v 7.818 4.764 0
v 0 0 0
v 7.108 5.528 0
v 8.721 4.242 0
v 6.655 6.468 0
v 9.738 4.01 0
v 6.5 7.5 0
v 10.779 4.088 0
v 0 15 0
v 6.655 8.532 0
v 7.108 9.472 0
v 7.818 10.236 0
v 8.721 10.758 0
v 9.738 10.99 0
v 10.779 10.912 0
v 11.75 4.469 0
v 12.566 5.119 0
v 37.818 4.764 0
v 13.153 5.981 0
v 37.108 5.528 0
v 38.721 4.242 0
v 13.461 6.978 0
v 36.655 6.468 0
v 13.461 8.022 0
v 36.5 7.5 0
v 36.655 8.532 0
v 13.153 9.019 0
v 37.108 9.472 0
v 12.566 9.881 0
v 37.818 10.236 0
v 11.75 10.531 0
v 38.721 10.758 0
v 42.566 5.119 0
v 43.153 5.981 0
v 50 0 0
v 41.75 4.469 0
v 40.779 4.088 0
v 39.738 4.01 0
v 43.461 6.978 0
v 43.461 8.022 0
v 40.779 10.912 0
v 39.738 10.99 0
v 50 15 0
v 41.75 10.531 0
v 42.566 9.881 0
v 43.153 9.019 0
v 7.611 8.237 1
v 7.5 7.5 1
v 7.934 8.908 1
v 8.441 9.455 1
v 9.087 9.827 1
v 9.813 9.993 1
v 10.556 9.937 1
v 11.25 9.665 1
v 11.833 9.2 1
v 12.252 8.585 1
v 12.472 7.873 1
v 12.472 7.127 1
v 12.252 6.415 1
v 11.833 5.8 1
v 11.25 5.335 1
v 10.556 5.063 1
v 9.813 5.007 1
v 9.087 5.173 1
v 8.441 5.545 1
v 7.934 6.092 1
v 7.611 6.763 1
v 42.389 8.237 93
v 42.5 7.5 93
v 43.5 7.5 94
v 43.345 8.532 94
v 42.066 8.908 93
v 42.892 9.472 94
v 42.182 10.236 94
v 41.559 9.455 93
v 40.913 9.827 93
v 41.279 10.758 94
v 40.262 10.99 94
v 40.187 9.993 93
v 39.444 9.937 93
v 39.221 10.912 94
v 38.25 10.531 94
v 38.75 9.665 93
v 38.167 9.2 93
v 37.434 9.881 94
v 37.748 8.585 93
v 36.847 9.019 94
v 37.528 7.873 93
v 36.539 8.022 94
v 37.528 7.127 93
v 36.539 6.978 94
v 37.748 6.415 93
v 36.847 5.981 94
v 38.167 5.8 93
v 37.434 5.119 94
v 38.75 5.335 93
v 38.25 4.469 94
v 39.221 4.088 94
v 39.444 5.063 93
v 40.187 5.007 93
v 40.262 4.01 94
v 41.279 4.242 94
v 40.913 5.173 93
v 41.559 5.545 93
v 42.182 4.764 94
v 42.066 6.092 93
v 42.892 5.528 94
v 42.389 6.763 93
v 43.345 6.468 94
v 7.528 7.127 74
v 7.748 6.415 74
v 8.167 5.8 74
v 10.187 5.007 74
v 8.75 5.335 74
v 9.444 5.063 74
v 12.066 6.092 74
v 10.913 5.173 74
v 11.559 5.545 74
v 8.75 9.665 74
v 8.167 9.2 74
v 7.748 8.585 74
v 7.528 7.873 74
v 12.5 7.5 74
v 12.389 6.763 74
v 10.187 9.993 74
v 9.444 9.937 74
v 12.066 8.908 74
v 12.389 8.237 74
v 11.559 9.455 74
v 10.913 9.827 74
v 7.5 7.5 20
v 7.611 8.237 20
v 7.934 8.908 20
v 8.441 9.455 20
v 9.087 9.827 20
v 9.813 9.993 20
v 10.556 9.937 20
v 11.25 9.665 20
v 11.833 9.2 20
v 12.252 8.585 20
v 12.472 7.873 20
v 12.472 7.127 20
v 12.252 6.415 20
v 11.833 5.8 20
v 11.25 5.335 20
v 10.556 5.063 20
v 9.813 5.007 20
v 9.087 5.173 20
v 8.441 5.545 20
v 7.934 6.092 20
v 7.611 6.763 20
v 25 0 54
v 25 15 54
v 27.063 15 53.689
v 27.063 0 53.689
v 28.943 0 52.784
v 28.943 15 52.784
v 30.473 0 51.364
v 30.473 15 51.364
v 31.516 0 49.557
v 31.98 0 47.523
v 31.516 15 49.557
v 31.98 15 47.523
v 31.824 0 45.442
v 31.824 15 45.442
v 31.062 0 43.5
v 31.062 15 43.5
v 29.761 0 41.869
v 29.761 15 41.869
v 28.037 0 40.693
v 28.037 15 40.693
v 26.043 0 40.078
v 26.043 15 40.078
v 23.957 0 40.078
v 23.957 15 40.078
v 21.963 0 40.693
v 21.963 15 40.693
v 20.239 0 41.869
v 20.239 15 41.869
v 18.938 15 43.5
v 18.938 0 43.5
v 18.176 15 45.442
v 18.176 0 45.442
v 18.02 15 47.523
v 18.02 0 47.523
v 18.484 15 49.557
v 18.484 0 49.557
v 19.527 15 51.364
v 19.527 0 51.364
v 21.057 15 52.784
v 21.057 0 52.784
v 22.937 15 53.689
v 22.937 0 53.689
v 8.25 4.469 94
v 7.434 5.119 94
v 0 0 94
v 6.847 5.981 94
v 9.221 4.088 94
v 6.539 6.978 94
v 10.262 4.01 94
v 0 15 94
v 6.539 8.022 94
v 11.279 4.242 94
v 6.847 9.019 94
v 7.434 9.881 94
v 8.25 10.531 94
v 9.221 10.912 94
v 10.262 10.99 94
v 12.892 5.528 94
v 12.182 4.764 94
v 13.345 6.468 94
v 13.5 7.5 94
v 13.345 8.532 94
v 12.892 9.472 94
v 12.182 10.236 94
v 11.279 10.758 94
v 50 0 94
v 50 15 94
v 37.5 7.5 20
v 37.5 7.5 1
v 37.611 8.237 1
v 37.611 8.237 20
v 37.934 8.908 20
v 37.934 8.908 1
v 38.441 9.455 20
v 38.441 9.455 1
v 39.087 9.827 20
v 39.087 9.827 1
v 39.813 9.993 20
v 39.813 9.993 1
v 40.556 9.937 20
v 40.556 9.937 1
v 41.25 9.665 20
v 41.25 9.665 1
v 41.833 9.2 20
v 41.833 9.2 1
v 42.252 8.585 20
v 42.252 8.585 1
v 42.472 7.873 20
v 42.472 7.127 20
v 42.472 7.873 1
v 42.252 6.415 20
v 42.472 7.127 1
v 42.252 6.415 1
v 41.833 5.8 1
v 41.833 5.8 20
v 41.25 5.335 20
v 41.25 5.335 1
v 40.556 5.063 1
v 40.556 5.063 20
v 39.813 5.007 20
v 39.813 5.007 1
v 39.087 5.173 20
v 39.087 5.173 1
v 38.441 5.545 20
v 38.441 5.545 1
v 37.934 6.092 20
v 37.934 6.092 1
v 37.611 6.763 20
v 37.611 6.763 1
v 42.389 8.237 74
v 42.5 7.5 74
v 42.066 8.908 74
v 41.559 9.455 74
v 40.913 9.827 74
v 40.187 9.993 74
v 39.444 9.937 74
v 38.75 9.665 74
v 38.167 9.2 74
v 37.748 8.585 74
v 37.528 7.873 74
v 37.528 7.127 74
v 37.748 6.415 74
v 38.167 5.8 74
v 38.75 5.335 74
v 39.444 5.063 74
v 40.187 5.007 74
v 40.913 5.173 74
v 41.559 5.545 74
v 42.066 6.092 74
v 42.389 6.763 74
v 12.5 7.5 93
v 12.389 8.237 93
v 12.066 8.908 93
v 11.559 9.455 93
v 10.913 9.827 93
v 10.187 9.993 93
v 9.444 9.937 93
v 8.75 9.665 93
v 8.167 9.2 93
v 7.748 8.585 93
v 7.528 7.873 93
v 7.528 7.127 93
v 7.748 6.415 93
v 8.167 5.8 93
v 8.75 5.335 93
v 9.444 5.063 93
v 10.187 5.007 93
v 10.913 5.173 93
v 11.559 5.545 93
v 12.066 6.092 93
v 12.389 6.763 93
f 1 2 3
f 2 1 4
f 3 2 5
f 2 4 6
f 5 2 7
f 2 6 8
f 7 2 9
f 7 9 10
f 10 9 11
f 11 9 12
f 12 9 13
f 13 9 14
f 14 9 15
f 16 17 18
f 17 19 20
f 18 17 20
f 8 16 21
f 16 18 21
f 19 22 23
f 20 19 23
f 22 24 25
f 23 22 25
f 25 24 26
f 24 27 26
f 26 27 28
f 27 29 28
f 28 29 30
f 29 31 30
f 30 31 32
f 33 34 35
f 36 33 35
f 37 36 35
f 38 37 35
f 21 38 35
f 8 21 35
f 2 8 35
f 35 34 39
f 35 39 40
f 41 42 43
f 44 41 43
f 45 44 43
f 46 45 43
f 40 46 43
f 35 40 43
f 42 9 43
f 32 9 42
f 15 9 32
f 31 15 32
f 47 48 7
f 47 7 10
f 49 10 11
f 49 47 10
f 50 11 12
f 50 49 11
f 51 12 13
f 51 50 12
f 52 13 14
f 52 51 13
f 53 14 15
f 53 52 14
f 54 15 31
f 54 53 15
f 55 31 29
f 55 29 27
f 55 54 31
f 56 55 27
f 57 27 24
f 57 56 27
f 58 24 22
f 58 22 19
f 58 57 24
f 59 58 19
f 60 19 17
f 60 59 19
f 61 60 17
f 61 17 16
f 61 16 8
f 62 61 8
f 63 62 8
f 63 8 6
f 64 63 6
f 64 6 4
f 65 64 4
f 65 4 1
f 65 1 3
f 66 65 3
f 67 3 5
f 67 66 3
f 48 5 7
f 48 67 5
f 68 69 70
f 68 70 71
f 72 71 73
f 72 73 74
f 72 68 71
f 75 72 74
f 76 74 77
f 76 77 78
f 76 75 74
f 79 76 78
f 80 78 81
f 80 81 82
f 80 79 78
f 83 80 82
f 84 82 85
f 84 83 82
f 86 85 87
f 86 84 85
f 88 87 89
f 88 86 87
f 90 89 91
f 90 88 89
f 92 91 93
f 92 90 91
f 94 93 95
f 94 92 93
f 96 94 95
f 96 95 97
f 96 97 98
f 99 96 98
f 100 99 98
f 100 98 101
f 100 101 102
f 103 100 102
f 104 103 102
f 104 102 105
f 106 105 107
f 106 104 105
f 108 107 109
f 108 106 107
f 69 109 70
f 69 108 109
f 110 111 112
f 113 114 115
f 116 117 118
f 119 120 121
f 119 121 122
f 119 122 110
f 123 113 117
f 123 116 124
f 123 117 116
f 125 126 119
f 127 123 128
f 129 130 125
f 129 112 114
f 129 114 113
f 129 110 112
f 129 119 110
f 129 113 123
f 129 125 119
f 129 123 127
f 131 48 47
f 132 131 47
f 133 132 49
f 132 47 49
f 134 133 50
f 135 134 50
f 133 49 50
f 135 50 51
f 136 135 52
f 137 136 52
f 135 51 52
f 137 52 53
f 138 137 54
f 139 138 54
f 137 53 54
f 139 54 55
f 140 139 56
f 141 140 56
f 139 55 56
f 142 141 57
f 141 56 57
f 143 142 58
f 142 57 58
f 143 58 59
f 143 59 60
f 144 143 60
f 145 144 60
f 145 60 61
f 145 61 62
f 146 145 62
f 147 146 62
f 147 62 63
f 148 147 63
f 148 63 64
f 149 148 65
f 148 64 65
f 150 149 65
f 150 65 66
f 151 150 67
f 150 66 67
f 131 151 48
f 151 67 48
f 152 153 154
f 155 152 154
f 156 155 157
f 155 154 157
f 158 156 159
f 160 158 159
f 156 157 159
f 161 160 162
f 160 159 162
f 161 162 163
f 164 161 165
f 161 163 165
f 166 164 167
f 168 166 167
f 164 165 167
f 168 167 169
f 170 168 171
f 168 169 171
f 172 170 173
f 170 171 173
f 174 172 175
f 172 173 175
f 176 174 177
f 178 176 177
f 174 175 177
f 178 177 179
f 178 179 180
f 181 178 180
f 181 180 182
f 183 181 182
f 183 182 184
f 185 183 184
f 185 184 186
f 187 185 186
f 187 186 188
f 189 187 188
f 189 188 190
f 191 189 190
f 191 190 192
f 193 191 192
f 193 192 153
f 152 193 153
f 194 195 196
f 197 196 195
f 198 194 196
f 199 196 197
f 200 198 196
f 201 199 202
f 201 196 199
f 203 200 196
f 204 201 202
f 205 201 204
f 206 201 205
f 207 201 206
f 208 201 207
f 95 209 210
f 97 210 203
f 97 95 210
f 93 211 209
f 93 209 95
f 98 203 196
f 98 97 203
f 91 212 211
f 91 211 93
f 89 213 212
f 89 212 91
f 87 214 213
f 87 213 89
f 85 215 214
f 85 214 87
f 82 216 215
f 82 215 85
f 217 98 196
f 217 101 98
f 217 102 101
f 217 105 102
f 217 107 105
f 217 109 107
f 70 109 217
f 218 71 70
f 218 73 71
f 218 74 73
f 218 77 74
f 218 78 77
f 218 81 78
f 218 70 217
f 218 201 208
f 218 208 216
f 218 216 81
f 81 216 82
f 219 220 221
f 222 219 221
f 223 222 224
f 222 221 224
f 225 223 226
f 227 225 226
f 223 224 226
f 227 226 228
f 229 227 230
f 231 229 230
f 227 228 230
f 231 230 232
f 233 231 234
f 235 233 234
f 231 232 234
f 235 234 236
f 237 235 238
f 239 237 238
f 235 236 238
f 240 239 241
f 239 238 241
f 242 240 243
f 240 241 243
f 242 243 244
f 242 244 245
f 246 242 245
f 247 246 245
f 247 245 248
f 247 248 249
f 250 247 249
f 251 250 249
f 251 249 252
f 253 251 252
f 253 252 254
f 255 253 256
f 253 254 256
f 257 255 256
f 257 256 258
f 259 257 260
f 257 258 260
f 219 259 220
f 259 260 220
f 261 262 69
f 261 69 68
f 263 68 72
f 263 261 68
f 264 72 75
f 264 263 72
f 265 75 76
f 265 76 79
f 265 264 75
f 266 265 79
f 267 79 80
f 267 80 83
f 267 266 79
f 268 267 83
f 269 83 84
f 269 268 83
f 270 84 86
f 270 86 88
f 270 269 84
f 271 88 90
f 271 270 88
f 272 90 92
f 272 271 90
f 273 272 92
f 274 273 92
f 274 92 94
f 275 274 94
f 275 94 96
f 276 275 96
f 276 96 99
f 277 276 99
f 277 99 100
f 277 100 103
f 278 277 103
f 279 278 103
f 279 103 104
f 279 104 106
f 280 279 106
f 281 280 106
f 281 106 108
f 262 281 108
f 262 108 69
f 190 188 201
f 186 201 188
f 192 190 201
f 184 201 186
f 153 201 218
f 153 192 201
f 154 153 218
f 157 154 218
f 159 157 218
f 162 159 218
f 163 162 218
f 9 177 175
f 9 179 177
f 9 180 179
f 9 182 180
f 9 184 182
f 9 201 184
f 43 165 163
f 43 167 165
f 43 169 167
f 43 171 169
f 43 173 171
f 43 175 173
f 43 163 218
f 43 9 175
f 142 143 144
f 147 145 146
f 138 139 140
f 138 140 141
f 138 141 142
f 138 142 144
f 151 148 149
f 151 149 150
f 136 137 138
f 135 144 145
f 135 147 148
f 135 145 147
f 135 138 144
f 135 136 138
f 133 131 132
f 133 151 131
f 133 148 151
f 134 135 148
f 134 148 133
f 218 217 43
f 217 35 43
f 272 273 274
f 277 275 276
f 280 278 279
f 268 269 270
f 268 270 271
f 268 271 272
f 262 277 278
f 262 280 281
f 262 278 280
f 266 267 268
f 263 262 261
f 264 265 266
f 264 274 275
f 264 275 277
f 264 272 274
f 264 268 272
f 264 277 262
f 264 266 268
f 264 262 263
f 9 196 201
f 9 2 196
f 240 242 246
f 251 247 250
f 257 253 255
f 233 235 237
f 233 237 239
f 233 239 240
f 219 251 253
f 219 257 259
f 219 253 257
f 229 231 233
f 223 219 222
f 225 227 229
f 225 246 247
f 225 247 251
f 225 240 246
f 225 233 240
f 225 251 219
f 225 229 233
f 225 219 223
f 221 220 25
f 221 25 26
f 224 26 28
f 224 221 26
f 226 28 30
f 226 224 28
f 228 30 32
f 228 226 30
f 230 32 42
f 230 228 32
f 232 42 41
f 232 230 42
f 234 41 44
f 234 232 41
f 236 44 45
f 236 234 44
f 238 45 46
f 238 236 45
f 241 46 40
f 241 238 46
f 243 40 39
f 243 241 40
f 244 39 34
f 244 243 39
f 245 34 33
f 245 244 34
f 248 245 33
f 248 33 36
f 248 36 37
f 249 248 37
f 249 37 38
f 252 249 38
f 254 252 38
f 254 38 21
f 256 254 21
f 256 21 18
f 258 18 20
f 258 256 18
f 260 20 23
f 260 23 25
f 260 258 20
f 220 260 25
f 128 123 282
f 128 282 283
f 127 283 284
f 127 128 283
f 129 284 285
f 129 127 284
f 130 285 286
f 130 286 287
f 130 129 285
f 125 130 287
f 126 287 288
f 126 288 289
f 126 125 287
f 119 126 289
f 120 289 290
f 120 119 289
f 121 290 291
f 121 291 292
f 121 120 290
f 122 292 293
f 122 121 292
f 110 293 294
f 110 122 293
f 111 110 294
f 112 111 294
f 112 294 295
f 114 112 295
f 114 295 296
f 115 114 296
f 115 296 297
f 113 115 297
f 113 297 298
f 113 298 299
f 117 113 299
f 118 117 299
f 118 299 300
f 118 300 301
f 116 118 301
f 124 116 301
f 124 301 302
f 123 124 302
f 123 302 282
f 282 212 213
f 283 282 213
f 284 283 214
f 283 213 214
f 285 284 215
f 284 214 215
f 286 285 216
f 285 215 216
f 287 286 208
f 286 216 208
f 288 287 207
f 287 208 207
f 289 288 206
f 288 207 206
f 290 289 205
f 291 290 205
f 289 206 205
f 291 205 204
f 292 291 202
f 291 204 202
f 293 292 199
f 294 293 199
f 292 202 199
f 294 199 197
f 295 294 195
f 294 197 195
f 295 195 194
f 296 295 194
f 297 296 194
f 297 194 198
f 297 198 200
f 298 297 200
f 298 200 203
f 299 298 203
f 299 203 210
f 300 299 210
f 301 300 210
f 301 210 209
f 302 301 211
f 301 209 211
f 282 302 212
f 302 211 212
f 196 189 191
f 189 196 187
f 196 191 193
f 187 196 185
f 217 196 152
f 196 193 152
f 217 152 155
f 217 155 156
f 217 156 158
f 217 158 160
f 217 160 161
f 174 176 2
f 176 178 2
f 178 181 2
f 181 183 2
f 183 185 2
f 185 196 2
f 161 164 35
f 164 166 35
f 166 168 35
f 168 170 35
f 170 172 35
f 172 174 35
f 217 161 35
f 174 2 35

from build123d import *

# Parameters (mm, degrees)
SZKIC1_W                    = 50
SZKIC1_H                    = 15
DODANIE_WYCI_GNI_CIE1_DEPTH = 47
SZKIC2_R                    = 2.5
WYTNIJ_WYCI_GNI_CIE1_DEPTH  = 20
LUSTRO1_START               = 47
LUSTRO1_OUTLINE_W           = 50
LUSTRO1_OUTLINE_H           = 15
LUSTRO1_OUTLINE_R           = 2.5
LUSTRO1_DEPTH               = 47
LUSTRO1_2_OUTLINE_R         = 2.5
LUSTRO1_2_DEPTH             = 27
SZKIC5_R                    = 7
WYTNIJ_WYCI_GNI_CIE2_DEPTH  = 108.522090753
SFAZOWANIE2_SIZE            = 1


# Read off the part's stored shape, not the designer's step: Lustro1
with BuildPart() as part:
    # Szkic1 → Dodanie-wyciągnięcie1 (new body)
    with BuildSketch(Plane.XY):
        with Locations((25, 7.5)):
            Rectangle(SZKIC1_W, SZKIC1_H)
    extrude(amount=DODANIE_WYCI_GNI_CIE1_DEPTH)

    # Szkic2 → Wytnij-wyciągnięcie1 (cut)
    with BuildSketch(Plane(origin=(0, 0, 0), x_dir=(-1, 0, 0), z_dir=(0, 0, -1))):
        with Locations((-40, 7.5)):
            Circle(SZKIC2_R)
        with Locations((-10, 7.5)):
            Circle(SZKIC2_R)
    extrude(amount=-WYTNIJ_WYCI_GNI_CIE1_DEPTH, mode=Mode.SUBTRACT)

    # Lustro1 outline → Lustro1 (add)
    with BuildSketch(Plane.XY.offset(LUSTRO1_START)):
        with Locations((25, 7.5)):
            Rectangle(LUSTRO1_OUTLINE_W, LUSTRO1_OUTLINE_H)
        with Locations((10, 7.5)):
            Circle(LUSTRO1_OUTLINE_R, mode=Mode.SUBTRACT)
        with Locations((40, 7.5)):
            Circle(LUSTRO1_OUTLINE_R, mode=Mode.SUBTRACT)
    extrude(amount=LUSTRO1_DEPTH)

    # Lustro1 2 outline → Lustro1 2 (add)
    with BuildSketch(Plane.XY.offset(LUSTRO1_START)):
        with Locations((10, 7.5)):
            Circle(LUSTRO1_2_OUTLINE_R)
        with Locations((40, 7.5)):
            Circle(LUSTRO1_2_OUTLINE_R)
    extrude(amount=LUSTRO1_2_DEPTH)

    # Szkic5 → Wytnij-wyciągnięcie2 (cut, through all)
    with BuildSketch(Plane(origin=(0, 15, 0), x_dir=(1, 0, 0), z_dir=(0, 1, 0))):
        with Locations(Location((25, -47, 0), (0, 0, 270))):
            Circle(SZKIC5_R)
    extrude(amount=-WYTNIJ_WYCI_GNI_CIE2_DEPTH, mode=Mode.SUBTRACT)

    # Sfazowanie2
    sfazowanie2_edges = [part.edges().sort_by_distance(p)[0] for p in [
        (42.5, 7.5, 0),
        (12.5, 7.5, 0),
        (37.5, 7.5, 94),
        (7.5, 7.5, 94),
    ]]
    chamfer(sfazowanie2_edges, length=SFAZOWANIE2_SIZE)


solid = part.part
